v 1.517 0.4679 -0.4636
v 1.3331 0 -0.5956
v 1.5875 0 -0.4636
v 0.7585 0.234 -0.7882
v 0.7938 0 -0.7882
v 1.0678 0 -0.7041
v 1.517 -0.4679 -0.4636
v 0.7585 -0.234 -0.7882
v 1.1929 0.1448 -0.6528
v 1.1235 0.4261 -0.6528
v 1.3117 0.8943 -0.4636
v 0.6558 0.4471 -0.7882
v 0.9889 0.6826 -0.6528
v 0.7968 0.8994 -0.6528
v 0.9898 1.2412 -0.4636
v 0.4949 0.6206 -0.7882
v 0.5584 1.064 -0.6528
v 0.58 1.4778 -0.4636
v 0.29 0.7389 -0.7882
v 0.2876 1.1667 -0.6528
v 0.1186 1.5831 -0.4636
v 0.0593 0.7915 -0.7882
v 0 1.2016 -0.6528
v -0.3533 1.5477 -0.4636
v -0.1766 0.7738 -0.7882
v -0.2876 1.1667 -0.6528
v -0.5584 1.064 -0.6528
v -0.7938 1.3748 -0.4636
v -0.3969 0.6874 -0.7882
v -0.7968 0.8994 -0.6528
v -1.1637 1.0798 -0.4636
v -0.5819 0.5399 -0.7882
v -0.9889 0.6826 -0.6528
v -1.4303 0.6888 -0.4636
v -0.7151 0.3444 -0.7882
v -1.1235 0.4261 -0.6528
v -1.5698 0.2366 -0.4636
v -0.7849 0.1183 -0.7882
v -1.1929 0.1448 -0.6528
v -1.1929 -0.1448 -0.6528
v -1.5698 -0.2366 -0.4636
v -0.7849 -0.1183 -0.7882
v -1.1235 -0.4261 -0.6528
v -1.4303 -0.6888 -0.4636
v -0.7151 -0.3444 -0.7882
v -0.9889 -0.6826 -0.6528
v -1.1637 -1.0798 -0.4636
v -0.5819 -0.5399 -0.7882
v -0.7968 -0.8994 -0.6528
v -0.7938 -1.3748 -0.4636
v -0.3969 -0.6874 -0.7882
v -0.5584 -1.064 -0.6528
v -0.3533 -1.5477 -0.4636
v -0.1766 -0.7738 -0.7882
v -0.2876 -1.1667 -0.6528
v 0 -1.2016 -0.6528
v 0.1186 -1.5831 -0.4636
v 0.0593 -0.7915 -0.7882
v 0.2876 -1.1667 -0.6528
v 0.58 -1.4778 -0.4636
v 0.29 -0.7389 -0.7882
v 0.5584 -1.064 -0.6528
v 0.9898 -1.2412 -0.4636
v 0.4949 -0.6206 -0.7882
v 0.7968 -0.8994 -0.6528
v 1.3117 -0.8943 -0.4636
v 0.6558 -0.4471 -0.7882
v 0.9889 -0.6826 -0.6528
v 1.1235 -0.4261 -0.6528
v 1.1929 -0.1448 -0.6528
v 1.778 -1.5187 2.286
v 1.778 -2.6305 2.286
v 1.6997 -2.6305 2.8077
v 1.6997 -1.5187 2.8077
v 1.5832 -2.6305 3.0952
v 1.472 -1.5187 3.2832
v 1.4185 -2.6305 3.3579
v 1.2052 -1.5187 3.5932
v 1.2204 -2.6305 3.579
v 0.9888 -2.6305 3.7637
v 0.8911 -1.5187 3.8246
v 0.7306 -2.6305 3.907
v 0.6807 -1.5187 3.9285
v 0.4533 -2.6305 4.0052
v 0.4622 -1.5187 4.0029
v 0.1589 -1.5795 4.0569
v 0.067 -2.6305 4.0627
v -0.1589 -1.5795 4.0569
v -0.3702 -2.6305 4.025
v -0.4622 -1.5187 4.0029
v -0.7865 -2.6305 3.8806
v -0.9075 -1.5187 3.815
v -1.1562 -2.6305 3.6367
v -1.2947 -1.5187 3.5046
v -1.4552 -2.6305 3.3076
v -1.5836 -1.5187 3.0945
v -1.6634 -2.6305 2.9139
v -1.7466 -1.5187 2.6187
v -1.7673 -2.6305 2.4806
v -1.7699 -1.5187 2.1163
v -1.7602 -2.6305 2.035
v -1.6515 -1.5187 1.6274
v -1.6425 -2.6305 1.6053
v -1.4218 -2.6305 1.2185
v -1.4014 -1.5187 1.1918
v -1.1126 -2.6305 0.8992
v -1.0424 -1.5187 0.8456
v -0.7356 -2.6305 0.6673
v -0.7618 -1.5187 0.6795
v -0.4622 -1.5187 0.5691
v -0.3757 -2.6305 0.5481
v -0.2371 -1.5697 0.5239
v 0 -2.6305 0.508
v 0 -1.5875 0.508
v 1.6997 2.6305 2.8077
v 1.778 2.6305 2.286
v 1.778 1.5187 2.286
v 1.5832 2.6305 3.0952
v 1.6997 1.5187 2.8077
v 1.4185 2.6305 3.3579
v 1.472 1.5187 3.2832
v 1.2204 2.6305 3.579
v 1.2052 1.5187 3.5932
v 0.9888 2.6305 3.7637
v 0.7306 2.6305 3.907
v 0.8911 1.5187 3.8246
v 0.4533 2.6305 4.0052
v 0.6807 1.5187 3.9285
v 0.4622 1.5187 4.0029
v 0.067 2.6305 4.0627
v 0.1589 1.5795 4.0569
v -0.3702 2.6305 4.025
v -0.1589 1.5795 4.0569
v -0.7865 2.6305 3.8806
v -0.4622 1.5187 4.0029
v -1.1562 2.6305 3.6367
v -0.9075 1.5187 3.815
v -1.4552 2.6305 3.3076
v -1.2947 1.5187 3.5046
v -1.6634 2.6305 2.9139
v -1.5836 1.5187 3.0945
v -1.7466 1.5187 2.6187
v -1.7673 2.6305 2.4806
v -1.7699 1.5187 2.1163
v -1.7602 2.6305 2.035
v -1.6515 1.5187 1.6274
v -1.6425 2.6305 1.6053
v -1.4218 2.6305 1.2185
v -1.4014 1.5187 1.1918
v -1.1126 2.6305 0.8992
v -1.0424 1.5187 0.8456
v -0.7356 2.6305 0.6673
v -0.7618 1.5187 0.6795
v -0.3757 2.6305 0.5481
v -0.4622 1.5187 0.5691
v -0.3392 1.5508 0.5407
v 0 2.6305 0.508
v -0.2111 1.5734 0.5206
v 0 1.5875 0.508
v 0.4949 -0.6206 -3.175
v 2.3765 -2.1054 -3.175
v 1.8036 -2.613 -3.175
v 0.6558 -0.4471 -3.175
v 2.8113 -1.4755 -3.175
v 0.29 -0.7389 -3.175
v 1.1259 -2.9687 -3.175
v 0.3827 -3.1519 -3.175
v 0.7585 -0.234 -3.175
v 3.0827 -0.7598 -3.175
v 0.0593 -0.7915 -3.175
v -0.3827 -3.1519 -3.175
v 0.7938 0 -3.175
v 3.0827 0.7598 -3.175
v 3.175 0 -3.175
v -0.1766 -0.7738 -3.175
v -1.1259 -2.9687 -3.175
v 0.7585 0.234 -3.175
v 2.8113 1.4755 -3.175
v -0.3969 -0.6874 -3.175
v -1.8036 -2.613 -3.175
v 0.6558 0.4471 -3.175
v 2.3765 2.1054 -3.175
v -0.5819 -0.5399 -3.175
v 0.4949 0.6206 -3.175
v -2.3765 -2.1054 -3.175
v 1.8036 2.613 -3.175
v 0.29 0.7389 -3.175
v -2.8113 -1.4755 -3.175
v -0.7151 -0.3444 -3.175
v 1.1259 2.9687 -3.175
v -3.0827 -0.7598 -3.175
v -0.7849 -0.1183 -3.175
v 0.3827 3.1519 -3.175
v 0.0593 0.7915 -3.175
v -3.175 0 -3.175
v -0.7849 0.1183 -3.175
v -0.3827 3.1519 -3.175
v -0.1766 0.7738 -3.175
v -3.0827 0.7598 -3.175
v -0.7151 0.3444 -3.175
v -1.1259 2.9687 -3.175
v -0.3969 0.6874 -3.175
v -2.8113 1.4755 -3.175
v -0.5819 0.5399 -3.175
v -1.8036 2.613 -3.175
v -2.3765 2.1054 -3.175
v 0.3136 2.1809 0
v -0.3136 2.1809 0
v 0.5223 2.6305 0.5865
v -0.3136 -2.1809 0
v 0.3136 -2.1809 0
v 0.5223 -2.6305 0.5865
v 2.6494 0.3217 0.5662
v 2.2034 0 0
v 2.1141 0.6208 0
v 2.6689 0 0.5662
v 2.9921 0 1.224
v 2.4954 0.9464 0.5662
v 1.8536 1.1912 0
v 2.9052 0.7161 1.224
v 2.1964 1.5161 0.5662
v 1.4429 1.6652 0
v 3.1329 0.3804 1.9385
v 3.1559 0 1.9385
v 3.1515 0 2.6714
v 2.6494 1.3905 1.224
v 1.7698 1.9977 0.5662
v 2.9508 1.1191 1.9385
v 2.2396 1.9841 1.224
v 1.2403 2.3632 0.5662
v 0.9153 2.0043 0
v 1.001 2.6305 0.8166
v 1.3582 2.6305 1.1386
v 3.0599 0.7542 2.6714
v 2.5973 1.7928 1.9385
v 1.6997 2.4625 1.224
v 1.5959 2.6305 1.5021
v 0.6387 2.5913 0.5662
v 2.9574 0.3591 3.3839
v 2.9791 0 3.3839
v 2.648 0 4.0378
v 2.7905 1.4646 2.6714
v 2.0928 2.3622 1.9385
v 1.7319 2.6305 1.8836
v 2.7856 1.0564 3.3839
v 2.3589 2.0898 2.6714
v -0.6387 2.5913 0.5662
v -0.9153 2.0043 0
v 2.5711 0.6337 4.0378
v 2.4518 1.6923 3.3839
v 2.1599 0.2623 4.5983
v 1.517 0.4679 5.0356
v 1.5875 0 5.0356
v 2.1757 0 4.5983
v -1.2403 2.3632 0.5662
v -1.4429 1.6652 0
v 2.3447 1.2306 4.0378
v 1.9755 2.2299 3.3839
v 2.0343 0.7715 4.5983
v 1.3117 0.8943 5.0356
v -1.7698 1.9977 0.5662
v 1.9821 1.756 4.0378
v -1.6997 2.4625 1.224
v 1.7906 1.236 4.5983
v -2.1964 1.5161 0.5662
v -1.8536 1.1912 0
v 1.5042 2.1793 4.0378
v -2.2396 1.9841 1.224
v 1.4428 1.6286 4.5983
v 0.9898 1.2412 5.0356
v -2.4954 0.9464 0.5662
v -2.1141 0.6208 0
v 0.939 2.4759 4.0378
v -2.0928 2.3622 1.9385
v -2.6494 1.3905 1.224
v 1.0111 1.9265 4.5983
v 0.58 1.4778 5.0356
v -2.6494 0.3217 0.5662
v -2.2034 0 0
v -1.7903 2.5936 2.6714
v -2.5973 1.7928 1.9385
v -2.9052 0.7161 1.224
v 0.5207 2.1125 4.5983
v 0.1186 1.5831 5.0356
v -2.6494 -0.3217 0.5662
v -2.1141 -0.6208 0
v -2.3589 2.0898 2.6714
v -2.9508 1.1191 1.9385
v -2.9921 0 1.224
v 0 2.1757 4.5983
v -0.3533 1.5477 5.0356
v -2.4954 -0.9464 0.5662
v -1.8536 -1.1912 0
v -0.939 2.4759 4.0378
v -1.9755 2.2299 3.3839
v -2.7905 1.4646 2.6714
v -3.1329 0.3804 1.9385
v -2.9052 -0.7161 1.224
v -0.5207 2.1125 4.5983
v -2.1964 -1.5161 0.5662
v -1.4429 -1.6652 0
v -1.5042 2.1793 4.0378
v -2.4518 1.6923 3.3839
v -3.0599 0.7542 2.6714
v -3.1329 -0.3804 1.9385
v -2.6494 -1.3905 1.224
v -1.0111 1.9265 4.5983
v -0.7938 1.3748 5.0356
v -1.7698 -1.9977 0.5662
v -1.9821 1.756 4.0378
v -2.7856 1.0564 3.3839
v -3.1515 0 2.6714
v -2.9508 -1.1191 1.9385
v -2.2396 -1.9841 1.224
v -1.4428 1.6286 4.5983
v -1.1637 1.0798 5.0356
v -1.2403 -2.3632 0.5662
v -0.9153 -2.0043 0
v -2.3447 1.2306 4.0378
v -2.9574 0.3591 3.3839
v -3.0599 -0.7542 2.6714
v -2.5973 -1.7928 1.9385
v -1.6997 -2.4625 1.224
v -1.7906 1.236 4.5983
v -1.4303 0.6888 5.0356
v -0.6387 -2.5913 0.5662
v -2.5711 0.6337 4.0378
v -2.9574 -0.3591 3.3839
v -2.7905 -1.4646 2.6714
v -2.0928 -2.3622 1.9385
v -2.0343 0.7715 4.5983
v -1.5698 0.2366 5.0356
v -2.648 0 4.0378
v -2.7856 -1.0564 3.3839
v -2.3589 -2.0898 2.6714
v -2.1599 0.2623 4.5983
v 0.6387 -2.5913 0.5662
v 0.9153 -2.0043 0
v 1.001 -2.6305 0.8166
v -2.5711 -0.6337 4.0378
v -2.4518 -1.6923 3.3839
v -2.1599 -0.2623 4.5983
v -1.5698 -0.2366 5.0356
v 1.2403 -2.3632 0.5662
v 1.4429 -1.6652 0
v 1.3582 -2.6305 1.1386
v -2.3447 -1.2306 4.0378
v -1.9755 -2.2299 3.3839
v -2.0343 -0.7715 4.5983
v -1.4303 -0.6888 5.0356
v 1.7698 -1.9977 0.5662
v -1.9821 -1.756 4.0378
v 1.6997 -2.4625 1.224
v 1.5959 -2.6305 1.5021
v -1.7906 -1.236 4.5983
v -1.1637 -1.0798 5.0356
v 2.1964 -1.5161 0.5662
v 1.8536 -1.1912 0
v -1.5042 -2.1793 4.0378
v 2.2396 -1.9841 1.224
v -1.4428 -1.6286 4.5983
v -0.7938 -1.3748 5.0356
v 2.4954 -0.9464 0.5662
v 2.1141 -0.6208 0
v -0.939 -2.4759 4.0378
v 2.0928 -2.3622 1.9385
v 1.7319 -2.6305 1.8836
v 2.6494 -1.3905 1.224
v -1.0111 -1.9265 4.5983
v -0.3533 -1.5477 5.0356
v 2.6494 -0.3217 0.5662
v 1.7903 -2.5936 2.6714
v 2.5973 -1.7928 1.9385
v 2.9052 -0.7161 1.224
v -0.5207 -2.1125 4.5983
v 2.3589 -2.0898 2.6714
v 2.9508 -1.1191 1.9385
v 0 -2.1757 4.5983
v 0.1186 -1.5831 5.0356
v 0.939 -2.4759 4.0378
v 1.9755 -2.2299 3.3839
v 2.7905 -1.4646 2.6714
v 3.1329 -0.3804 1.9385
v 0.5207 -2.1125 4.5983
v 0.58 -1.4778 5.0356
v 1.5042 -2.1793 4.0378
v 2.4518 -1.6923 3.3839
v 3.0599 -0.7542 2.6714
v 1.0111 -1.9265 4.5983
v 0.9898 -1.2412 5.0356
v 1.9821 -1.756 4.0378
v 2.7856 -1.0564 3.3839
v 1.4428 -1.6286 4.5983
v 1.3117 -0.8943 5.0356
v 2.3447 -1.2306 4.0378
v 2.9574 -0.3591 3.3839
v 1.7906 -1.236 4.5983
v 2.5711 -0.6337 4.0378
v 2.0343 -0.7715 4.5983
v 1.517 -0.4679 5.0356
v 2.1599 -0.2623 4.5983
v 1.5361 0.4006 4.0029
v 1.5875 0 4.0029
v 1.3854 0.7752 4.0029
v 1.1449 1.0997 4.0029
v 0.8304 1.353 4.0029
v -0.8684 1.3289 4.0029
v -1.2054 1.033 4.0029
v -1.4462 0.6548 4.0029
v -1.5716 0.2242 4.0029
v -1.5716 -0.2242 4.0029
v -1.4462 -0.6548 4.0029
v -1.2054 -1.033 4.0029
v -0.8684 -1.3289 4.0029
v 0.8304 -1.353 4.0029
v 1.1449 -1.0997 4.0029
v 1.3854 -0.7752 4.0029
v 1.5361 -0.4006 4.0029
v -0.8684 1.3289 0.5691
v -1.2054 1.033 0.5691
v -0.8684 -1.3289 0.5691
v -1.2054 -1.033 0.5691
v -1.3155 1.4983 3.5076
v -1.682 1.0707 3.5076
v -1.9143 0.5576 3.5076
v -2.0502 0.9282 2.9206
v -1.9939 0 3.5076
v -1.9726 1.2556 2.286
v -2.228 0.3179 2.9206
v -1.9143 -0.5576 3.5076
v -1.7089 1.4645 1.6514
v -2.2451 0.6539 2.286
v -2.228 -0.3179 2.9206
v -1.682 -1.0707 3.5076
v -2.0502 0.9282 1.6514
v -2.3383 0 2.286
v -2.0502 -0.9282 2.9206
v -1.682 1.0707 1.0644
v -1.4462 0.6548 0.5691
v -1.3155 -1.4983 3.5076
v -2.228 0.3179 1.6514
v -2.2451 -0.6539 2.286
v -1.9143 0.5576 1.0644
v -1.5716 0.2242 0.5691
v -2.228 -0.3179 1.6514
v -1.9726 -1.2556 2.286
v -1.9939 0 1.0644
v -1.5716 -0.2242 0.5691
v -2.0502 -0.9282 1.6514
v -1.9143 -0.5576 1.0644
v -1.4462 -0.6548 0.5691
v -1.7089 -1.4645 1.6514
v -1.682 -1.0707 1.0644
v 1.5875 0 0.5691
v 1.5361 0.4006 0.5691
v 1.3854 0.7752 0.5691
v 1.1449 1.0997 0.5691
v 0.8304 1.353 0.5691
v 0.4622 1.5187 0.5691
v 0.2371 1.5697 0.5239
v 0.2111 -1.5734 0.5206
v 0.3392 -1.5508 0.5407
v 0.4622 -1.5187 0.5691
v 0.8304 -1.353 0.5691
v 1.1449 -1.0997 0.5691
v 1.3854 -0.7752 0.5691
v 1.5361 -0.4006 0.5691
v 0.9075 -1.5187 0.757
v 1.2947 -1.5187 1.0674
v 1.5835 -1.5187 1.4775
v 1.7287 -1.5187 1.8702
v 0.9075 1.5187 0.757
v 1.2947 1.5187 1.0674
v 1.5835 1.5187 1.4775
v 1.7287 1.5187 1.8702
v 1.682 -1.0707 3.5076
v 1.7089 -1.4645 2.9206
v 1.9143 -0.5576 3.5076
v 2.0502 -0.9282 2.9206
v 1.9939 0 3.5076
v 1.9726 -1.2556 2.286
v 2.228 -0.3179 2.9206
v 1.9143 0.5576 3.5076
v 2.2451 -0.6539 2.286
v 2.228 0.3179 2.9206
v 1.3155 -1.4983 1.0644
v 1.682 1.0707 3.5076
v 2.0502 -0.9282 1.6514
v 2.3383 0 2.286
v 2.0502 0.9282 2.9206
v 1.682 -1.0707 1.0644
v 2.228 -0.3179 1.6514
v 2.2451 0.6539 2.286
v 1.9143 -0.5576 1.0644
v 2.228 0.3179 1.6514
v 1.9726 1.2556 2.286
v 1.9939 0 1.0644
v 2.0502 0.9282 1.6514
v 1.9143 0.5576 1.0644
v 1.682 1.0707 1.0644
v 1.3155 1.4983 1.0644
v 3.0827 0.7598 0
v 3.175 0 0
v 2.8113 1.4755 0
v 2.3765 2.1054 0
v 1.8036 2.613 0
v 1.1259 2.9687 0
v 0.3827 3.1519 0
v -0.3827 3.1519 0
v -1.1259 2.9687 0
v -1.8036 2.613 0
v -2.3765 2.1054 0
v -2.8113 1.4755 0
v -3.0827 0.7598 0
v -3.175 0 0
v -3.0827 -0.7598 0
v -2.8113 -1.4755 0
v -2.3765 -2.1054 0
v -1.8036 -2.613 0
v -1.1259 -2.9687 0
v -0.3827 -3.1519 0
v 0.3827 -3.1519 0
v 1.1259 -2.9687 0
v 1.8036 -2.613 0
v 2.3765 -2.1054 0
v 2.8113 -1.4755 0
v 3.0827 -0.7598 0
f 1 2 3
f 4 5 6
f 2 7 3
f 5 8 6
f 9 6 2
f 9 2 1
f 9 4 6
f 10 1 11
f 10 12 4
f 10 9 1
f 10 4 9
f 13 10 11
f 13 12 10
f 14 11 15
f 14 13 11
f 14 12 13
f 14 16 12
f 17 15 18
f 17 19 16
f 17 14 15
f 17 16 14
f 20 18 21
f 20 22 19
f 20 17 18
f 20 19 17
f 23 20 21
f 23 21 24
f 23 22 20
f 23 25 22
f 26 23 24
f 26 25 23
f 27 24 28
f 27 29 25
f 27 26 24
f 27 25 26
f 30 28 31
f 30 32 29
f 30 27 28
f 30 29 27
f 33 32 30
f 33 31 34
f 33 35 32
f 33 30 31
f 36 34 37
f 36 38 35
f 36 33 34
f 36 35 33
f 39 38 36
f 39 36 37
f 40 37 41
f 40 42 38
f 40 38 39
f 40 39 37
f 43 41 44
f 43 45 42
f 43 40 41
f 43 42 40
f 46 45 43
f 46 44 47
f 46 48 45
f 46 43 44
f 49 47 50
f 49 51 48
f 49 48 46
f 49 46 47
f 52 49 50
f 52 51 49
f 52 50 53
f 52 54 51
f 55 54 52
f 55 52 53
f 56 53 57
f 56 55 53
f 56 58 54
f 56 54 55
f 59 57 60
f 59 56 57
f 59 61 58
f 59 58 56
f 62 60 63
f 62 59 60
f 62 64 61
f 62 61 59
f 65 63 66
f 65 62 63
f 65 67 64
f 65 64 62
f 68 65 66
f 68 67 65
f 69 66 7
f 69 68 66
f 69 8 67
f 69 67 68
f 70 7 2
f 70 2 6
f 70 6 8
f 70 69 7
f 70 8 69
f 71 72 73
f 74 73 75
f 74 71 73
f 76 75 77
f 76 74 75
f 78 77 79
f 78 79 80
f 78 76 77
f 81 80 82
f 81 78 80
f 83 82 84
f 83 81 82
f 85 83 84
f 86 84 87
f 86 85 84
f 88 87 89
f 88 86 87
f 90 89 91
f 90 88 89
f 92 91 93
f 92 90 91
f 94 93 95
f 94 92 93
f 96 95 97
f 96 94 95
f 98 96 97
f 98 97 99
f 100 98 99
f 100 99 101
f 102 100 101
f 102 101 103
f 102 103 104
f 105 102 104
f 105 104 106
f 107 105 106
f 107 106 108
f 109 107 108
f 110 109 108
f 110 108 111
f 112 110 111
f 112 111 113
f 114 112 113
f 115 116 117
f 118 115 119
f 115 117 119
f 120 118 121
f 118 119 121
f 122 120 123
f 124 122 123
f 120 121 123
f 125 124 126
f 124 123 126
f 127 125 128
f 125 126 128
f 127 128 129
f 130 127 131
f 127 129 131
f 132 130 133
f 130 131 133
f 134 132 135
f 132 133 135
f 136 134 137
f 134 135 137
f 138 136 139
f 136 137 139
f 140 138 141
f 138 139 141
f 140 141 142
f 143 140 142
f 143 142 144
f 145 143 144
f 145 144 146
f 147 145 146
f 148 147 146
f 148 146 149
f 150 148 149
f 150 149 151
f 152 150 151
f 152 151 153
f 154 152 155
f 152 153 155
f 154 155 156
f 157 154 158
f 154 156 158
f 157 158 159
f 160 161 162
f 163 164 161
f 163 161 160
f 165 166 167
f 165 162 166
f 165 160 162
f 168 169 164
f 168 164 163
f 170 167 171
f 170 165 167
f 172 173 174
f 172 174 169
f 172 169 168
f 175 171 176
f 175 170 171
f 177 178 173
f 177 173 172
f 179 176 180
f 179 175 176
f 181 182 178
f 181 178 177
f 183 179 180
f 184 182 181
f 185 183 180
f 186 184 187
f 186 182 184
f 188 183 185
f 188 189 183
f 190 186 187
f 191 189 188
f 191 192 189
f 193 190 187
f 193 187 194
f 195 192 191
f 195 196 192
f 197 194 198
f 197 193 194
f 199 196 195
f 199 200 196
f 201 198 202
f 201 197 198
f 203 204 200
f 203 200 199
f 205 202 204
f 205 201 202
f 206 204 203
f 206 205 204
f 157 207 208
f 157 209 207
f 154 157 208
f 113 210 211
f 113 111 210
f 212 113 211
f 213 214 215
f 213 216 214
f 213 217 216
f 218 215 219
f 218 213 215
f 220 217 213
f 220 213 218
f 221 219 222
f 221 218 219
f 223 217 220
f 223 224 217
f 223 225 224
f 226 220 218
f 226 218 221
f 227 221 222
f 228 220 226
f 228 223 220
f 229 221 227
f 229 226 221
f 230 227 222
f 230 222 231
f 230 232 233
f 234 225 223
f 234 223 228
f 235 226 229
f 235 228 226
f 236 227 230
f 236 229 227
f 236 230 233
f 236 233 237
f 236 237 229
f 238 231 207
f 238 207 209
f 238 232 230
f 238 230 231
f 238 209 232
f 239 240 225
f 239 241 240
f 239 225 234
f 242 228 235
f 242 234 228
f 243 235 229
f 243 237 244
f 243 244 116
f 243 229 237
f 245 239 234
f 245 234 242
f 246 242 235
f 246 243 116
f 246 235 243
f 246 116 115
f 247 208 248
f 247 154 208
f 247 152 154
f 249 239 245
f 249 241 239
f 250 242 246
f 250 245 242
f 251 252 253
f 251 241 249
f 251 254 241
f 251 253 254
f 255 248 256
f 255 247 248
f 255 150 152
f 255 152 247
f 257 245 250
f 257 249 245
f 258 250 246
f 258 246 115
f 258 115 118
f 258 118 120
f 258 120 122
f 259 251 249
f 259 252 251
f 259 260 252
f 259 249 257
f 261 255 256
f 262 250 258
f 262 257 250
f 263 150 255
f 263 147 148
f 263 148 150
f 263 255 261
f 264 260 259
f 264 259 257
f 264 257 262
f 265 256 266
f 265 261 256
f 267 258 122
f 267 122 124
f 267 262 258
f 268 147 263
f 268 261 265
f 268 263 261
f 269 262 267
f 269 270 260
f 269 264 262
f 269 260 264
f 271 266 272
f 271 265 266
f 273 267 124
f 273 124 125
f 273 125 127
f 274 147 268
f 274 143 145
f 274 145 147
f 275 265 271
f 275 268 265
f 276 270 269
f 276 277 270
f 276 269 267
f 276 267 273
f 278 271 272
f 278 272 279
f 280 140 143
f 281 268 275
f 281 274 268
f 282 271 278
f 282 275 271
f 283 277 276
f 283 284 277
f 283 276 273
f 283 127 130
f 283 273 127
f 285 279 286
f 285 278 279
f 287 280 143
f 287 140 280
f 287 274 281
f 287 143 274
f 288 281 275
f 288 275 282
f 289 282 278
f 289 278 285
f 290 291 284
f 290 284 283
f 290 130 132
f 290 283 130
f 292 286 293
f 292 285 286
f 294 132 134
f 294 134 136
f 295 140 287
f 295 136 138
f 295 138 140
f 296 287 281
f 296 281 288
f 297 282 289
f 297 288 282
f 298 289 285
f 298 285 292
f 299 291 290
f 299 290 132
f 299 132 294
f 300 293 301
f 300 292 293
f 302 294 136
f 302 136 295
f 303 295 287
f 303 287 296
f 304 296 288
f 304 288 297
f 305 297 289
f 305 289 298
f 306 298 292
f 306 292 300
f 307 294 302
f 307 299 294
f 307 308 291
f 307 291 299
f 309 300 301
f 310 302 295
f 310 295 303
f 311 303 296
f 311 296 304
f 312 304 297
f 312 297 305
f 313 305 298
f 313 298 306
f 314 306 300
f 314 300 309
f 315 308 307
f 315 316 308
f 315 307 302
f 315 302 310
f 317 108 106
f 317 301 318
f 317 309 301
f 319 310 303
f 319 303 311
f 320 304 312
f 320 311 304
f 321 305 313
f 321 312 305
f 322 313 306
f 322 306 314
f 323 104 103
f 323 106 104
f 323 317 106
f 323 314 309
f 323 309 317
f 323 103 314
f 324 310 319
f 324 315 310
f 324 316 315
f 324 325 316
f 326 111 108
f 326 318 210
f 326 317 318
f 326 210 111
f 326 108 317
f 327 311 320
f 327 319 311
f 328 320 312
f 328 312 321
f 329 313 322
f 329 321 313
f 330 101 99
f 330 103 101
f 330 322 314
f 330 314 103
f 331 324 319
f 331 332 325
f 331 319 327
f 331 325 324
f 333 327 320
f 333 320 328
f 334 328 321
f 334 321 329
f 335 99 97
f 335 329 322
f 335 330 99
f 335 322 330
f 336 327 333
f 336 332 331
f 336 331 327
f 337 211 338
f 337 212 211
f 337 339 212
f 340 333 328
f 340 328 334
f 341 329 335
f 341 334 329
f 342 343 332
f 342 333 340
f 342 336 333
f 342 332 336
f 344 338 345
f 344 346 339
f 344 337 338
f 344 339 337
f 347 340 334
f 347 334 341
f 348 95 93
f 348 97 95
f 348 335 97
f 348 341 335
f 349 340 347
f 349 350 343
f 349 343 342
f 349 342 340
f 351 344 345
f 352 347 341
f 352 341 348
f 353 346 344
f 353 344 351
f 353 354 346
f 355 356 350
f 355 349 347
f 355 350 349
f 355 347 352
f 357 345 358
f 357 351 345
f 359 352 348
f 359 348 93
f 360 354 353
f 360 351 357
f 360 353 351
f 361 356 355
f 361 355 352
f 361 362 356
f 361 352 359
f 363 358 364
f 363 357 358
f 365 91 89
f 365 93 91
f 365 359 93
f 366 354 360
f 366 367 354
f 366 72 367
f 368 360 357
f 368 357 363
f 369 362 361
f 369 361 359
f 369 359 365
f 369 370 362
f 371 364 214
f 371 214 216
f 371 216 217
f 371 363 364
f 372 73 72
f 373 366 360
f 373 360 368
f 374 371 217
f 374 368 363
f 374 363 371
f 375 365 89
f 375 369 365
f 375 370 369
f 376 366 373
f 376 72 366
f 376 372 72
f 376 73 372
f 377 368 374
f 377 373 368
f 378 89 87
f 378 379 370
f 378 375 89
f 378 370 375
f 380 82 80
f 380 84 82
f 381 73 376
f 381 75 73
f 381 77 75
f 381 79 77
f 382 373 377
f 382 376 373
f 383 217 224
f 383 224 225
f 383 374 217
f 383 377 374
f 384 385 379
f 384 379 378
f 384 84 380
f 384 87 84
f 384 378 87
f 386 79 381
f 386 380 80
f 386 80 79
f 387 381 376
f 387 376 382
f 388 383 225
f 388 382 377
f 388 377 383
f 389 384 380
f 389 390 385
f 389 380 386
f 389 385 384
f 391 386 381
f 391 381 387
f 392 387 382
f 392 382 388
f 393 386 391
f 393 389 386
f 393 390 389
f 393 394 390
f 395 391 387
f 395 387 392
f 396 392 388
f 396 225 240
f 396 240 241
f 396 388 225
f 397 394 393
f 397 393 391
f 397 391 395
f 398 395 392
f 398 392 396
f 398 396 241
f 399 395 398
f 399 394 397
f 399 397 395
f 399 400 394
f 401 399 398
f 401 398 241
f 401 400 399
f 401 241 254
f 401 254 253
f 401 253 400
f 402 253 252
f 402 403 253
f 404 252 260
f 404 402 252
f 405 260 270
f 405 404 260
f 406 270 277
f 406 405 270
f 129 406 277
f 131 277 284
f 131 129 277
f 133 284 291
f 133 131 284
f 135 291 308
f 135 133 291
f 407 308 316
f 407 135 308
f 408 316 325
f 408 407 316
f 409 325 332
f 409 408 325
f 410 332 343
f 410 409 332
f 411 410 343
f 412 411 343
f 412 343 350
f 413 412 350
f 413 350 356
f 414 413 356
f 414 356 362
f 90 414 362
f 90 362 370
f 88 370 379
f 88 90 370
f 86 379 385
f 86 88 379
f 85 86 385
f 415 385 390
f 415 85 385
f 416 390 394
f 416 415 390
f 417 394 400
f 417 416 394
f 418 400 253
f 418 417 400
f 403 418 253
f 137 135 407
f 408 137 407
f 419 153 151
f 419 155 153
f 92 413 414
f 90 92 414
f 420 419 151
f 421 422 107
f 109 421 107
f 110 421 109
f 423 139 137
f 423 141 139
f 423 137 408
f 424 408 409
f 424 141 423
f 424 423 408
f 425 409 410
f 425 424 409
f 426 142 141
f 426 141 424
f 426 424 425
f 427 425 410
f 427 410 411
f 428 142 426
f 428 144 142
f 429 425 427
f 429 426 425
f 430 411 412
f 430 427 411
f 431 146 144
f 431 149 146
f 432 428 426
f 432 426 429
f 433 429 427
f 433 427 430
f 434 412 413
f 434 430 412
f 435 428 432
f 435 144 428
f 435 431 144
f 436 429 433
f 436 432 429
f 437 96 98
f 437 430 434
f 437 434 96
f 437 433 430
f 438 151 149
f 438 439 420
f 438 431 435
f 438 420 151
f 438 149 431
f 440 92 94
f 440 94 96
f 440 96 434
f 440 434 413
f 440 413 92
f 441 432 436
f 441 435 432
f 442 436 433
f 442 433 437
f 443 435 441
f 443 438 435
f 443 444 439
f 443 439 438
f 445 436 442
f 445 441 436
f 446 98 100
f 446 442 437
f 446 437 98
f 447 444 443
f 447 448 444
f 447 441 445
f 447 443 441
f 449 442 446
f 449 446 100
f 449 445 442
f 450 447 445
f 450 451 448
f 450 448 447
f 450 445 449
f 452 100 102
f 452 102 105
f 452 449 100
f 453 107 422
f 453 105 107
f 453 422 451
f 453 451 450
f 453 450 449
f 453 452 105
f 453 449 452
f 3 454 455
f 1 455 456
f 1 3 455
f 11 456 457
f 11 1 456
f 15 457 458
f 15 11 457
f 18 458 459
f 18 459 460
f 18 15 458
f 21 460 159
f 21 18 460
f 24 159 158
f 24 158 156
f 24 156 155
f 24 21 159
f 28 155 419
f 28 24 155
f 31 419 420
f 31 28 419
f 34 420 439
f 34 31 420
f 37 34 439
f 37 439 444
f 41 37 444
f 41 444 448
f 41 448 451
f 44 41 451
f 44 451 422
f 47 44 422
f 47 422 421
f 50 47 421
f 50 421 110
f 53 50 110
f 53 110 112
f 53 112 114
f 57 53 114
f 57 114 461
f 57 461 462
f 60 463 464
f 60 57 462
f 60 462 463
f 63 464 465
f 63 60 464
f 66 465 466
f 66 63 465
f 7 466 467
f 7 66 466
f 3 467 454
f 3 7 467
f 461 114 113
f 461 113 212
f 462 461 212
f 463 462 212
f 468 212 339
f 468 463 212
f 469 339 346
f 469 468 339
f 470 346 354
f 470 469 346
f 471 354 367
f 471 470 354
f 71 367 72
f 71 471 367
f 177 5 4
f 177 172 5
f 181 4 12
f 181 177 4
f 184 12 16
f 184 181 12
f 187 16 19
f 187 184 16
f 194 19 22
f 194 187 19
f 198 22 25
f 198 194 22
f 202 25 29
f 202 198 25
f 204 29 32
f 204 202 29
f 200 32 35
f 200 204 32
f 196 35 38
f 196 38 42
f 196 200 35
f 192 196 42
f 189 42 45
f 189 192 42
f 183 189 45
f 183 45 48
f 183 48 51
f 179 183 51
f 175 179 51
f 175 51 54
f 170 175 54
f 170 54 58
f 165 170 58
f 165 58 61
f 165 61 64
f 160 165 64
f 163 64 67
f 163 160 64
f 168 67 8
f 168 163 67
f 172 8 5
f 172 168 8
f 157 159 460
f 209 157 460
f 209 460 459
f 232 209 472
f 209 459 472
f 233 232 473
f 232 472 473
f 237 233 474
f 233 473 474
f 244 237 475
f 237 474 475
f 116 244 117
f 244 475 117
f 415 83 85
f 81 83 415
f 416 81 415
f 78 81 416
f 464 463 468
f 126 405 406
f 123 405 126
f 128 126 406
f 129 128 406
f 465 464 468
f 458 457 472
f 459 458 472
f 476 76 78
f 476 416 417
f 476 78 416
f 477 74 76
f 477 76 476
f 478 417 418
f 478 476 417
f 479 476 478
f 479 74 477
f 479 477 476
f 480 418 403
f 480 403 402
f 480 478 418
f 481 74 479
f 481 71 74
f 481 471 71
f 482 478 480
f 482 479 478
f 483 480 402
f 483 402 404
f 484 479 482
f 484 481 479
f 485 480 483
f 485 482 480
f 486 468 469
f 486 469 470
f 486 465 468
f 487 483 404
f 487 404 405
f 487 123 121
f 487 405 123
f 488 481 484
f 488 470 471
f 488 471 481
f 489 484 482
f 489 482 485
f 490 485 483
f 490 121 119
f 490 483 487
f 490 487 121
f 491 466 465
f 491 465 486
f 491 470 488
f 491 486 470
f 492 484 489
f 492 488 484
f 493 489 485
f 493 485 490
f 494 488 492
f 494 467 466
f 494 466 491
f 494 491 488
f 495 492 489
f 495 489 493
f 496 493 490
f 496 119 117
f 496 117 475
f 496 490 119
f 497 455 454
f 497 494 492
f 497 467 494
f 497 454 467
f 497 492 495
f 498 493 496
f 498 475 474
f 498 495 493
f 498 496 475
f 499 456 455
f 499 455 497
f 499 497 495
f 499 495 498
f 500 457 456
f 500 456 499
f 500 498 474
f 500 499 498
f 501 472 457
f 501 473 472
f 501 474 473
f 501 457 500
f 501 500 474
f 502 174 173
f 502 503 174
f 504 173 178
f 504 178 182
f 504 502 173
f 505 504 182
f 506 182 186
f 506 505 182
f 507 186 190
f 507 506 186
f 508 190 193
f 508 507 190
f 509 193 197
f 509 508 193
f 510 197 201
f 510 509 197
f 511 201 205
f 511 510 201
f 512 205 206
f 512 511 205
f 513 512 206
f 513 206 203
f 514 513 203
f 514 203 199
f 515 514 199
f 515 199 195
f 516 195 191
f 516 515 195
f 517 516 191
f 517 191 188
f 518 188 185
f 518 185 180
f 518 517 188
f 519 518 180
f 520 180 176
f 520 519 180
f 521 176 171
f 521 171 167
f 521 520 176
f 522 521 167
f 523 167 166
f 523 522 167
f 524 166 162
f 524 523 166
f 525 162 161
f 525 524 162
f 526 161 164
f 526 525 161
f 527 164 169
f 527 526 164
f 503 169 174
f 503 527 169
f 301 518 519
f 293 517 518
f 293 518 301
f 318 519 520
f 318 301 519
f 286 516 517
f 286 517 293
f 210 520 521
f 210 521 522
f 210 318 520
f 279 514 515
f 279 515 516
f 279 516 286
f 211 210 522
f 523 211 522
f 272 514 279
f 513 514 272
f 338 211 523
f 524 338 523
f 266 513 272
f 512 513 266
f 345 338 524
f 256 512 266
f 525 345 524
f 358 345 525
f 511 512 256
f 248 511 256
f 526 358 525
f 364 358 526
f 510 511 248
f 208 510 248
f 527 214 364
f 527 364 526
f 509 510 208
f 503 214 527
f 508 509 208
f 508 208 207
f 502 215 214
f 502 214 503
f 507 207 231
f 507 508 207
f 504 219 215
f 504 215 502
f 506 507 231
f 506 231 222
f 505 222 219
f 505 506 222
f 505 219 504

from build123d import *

# Parameters (mm, degrees)
F3_DEPTH      = 3.176
F3_DEPTH_BACK = 25.4


with BuildPart() as f1:
    # F0 (on Front) → F1 (revolve)
    with BuildSketch(Plane.XZ):
        with BuildLine():
            Line((1.5875, 0.5691135997), (1.5875, 0))
            Line((1.5875, 0), (2.2033676498, 0))
            ThreePointArc((2.2033676498, 0), (3.1515176365, 2.6714368781), (1.5875, 5.035630657))
            Line((1.5875, 5.035630657), (1.5875, 4.0028864003))
            ThreePointArc((1.5875, 4.0028864003), (2.3383445344, 2.286), (1.5875, 0.5691135997))
        make_face()
        with BuildLine():
            ThreePointArc((1.5875, -0.463630657), (1.2016326584, -0.6528269691), (0.79375, -0.7881805311))
            Line((0.79375, -0.7881805311), (0.79375, -0.889))
            Line((0.79375, -0.889), (0.79375, -3.175))
            Line((0.79375, -3.175), (3.175, -3.175))
            Line((3.175, -3.175), (3.175, 0))
            Line((3.175, 0), (2.2033676498, 0))
            ThreePointArc((2.2033676498, 0), (1.9095569463, -0.2505758946), (1.5875, -0.463630657))
        make_face()
        with BuildLine():
            Line((2.2033676498, 0), (1.5875, 0))
            Line((1.5875, 0), (1.5875, -0.463630657))
            ThreePointArc((1.5875, -0.463630657), (1.9095569463, -0.2505758946), (2.2033676498, 0))
        make_face()
    revolve(axis=Axis((0, 0, 2.286), (0, 0, 1)))

    # F2 (on Front) → F3 (cut, two sides)
    with BuildSketch(Plane.XZ) as f3_sk:
        with BuildLine():
            ThreePointArc((0, 0.508), (1.2572358569, 1.0287641431), (1.778, 2.286))
            ThreePointArc((1.778, 2.286), (-1.2572358569, 3.5432358569), (0, 0.508))
        make_face()
    extrude(amount=F3_DEPTH, mode=Mode.SUBTRACT)
    extrude(f3_sk.sketch, amount=-F3_DEPTH_BACK, mode=Mode.SUBTRACT)


solid = f1.part
